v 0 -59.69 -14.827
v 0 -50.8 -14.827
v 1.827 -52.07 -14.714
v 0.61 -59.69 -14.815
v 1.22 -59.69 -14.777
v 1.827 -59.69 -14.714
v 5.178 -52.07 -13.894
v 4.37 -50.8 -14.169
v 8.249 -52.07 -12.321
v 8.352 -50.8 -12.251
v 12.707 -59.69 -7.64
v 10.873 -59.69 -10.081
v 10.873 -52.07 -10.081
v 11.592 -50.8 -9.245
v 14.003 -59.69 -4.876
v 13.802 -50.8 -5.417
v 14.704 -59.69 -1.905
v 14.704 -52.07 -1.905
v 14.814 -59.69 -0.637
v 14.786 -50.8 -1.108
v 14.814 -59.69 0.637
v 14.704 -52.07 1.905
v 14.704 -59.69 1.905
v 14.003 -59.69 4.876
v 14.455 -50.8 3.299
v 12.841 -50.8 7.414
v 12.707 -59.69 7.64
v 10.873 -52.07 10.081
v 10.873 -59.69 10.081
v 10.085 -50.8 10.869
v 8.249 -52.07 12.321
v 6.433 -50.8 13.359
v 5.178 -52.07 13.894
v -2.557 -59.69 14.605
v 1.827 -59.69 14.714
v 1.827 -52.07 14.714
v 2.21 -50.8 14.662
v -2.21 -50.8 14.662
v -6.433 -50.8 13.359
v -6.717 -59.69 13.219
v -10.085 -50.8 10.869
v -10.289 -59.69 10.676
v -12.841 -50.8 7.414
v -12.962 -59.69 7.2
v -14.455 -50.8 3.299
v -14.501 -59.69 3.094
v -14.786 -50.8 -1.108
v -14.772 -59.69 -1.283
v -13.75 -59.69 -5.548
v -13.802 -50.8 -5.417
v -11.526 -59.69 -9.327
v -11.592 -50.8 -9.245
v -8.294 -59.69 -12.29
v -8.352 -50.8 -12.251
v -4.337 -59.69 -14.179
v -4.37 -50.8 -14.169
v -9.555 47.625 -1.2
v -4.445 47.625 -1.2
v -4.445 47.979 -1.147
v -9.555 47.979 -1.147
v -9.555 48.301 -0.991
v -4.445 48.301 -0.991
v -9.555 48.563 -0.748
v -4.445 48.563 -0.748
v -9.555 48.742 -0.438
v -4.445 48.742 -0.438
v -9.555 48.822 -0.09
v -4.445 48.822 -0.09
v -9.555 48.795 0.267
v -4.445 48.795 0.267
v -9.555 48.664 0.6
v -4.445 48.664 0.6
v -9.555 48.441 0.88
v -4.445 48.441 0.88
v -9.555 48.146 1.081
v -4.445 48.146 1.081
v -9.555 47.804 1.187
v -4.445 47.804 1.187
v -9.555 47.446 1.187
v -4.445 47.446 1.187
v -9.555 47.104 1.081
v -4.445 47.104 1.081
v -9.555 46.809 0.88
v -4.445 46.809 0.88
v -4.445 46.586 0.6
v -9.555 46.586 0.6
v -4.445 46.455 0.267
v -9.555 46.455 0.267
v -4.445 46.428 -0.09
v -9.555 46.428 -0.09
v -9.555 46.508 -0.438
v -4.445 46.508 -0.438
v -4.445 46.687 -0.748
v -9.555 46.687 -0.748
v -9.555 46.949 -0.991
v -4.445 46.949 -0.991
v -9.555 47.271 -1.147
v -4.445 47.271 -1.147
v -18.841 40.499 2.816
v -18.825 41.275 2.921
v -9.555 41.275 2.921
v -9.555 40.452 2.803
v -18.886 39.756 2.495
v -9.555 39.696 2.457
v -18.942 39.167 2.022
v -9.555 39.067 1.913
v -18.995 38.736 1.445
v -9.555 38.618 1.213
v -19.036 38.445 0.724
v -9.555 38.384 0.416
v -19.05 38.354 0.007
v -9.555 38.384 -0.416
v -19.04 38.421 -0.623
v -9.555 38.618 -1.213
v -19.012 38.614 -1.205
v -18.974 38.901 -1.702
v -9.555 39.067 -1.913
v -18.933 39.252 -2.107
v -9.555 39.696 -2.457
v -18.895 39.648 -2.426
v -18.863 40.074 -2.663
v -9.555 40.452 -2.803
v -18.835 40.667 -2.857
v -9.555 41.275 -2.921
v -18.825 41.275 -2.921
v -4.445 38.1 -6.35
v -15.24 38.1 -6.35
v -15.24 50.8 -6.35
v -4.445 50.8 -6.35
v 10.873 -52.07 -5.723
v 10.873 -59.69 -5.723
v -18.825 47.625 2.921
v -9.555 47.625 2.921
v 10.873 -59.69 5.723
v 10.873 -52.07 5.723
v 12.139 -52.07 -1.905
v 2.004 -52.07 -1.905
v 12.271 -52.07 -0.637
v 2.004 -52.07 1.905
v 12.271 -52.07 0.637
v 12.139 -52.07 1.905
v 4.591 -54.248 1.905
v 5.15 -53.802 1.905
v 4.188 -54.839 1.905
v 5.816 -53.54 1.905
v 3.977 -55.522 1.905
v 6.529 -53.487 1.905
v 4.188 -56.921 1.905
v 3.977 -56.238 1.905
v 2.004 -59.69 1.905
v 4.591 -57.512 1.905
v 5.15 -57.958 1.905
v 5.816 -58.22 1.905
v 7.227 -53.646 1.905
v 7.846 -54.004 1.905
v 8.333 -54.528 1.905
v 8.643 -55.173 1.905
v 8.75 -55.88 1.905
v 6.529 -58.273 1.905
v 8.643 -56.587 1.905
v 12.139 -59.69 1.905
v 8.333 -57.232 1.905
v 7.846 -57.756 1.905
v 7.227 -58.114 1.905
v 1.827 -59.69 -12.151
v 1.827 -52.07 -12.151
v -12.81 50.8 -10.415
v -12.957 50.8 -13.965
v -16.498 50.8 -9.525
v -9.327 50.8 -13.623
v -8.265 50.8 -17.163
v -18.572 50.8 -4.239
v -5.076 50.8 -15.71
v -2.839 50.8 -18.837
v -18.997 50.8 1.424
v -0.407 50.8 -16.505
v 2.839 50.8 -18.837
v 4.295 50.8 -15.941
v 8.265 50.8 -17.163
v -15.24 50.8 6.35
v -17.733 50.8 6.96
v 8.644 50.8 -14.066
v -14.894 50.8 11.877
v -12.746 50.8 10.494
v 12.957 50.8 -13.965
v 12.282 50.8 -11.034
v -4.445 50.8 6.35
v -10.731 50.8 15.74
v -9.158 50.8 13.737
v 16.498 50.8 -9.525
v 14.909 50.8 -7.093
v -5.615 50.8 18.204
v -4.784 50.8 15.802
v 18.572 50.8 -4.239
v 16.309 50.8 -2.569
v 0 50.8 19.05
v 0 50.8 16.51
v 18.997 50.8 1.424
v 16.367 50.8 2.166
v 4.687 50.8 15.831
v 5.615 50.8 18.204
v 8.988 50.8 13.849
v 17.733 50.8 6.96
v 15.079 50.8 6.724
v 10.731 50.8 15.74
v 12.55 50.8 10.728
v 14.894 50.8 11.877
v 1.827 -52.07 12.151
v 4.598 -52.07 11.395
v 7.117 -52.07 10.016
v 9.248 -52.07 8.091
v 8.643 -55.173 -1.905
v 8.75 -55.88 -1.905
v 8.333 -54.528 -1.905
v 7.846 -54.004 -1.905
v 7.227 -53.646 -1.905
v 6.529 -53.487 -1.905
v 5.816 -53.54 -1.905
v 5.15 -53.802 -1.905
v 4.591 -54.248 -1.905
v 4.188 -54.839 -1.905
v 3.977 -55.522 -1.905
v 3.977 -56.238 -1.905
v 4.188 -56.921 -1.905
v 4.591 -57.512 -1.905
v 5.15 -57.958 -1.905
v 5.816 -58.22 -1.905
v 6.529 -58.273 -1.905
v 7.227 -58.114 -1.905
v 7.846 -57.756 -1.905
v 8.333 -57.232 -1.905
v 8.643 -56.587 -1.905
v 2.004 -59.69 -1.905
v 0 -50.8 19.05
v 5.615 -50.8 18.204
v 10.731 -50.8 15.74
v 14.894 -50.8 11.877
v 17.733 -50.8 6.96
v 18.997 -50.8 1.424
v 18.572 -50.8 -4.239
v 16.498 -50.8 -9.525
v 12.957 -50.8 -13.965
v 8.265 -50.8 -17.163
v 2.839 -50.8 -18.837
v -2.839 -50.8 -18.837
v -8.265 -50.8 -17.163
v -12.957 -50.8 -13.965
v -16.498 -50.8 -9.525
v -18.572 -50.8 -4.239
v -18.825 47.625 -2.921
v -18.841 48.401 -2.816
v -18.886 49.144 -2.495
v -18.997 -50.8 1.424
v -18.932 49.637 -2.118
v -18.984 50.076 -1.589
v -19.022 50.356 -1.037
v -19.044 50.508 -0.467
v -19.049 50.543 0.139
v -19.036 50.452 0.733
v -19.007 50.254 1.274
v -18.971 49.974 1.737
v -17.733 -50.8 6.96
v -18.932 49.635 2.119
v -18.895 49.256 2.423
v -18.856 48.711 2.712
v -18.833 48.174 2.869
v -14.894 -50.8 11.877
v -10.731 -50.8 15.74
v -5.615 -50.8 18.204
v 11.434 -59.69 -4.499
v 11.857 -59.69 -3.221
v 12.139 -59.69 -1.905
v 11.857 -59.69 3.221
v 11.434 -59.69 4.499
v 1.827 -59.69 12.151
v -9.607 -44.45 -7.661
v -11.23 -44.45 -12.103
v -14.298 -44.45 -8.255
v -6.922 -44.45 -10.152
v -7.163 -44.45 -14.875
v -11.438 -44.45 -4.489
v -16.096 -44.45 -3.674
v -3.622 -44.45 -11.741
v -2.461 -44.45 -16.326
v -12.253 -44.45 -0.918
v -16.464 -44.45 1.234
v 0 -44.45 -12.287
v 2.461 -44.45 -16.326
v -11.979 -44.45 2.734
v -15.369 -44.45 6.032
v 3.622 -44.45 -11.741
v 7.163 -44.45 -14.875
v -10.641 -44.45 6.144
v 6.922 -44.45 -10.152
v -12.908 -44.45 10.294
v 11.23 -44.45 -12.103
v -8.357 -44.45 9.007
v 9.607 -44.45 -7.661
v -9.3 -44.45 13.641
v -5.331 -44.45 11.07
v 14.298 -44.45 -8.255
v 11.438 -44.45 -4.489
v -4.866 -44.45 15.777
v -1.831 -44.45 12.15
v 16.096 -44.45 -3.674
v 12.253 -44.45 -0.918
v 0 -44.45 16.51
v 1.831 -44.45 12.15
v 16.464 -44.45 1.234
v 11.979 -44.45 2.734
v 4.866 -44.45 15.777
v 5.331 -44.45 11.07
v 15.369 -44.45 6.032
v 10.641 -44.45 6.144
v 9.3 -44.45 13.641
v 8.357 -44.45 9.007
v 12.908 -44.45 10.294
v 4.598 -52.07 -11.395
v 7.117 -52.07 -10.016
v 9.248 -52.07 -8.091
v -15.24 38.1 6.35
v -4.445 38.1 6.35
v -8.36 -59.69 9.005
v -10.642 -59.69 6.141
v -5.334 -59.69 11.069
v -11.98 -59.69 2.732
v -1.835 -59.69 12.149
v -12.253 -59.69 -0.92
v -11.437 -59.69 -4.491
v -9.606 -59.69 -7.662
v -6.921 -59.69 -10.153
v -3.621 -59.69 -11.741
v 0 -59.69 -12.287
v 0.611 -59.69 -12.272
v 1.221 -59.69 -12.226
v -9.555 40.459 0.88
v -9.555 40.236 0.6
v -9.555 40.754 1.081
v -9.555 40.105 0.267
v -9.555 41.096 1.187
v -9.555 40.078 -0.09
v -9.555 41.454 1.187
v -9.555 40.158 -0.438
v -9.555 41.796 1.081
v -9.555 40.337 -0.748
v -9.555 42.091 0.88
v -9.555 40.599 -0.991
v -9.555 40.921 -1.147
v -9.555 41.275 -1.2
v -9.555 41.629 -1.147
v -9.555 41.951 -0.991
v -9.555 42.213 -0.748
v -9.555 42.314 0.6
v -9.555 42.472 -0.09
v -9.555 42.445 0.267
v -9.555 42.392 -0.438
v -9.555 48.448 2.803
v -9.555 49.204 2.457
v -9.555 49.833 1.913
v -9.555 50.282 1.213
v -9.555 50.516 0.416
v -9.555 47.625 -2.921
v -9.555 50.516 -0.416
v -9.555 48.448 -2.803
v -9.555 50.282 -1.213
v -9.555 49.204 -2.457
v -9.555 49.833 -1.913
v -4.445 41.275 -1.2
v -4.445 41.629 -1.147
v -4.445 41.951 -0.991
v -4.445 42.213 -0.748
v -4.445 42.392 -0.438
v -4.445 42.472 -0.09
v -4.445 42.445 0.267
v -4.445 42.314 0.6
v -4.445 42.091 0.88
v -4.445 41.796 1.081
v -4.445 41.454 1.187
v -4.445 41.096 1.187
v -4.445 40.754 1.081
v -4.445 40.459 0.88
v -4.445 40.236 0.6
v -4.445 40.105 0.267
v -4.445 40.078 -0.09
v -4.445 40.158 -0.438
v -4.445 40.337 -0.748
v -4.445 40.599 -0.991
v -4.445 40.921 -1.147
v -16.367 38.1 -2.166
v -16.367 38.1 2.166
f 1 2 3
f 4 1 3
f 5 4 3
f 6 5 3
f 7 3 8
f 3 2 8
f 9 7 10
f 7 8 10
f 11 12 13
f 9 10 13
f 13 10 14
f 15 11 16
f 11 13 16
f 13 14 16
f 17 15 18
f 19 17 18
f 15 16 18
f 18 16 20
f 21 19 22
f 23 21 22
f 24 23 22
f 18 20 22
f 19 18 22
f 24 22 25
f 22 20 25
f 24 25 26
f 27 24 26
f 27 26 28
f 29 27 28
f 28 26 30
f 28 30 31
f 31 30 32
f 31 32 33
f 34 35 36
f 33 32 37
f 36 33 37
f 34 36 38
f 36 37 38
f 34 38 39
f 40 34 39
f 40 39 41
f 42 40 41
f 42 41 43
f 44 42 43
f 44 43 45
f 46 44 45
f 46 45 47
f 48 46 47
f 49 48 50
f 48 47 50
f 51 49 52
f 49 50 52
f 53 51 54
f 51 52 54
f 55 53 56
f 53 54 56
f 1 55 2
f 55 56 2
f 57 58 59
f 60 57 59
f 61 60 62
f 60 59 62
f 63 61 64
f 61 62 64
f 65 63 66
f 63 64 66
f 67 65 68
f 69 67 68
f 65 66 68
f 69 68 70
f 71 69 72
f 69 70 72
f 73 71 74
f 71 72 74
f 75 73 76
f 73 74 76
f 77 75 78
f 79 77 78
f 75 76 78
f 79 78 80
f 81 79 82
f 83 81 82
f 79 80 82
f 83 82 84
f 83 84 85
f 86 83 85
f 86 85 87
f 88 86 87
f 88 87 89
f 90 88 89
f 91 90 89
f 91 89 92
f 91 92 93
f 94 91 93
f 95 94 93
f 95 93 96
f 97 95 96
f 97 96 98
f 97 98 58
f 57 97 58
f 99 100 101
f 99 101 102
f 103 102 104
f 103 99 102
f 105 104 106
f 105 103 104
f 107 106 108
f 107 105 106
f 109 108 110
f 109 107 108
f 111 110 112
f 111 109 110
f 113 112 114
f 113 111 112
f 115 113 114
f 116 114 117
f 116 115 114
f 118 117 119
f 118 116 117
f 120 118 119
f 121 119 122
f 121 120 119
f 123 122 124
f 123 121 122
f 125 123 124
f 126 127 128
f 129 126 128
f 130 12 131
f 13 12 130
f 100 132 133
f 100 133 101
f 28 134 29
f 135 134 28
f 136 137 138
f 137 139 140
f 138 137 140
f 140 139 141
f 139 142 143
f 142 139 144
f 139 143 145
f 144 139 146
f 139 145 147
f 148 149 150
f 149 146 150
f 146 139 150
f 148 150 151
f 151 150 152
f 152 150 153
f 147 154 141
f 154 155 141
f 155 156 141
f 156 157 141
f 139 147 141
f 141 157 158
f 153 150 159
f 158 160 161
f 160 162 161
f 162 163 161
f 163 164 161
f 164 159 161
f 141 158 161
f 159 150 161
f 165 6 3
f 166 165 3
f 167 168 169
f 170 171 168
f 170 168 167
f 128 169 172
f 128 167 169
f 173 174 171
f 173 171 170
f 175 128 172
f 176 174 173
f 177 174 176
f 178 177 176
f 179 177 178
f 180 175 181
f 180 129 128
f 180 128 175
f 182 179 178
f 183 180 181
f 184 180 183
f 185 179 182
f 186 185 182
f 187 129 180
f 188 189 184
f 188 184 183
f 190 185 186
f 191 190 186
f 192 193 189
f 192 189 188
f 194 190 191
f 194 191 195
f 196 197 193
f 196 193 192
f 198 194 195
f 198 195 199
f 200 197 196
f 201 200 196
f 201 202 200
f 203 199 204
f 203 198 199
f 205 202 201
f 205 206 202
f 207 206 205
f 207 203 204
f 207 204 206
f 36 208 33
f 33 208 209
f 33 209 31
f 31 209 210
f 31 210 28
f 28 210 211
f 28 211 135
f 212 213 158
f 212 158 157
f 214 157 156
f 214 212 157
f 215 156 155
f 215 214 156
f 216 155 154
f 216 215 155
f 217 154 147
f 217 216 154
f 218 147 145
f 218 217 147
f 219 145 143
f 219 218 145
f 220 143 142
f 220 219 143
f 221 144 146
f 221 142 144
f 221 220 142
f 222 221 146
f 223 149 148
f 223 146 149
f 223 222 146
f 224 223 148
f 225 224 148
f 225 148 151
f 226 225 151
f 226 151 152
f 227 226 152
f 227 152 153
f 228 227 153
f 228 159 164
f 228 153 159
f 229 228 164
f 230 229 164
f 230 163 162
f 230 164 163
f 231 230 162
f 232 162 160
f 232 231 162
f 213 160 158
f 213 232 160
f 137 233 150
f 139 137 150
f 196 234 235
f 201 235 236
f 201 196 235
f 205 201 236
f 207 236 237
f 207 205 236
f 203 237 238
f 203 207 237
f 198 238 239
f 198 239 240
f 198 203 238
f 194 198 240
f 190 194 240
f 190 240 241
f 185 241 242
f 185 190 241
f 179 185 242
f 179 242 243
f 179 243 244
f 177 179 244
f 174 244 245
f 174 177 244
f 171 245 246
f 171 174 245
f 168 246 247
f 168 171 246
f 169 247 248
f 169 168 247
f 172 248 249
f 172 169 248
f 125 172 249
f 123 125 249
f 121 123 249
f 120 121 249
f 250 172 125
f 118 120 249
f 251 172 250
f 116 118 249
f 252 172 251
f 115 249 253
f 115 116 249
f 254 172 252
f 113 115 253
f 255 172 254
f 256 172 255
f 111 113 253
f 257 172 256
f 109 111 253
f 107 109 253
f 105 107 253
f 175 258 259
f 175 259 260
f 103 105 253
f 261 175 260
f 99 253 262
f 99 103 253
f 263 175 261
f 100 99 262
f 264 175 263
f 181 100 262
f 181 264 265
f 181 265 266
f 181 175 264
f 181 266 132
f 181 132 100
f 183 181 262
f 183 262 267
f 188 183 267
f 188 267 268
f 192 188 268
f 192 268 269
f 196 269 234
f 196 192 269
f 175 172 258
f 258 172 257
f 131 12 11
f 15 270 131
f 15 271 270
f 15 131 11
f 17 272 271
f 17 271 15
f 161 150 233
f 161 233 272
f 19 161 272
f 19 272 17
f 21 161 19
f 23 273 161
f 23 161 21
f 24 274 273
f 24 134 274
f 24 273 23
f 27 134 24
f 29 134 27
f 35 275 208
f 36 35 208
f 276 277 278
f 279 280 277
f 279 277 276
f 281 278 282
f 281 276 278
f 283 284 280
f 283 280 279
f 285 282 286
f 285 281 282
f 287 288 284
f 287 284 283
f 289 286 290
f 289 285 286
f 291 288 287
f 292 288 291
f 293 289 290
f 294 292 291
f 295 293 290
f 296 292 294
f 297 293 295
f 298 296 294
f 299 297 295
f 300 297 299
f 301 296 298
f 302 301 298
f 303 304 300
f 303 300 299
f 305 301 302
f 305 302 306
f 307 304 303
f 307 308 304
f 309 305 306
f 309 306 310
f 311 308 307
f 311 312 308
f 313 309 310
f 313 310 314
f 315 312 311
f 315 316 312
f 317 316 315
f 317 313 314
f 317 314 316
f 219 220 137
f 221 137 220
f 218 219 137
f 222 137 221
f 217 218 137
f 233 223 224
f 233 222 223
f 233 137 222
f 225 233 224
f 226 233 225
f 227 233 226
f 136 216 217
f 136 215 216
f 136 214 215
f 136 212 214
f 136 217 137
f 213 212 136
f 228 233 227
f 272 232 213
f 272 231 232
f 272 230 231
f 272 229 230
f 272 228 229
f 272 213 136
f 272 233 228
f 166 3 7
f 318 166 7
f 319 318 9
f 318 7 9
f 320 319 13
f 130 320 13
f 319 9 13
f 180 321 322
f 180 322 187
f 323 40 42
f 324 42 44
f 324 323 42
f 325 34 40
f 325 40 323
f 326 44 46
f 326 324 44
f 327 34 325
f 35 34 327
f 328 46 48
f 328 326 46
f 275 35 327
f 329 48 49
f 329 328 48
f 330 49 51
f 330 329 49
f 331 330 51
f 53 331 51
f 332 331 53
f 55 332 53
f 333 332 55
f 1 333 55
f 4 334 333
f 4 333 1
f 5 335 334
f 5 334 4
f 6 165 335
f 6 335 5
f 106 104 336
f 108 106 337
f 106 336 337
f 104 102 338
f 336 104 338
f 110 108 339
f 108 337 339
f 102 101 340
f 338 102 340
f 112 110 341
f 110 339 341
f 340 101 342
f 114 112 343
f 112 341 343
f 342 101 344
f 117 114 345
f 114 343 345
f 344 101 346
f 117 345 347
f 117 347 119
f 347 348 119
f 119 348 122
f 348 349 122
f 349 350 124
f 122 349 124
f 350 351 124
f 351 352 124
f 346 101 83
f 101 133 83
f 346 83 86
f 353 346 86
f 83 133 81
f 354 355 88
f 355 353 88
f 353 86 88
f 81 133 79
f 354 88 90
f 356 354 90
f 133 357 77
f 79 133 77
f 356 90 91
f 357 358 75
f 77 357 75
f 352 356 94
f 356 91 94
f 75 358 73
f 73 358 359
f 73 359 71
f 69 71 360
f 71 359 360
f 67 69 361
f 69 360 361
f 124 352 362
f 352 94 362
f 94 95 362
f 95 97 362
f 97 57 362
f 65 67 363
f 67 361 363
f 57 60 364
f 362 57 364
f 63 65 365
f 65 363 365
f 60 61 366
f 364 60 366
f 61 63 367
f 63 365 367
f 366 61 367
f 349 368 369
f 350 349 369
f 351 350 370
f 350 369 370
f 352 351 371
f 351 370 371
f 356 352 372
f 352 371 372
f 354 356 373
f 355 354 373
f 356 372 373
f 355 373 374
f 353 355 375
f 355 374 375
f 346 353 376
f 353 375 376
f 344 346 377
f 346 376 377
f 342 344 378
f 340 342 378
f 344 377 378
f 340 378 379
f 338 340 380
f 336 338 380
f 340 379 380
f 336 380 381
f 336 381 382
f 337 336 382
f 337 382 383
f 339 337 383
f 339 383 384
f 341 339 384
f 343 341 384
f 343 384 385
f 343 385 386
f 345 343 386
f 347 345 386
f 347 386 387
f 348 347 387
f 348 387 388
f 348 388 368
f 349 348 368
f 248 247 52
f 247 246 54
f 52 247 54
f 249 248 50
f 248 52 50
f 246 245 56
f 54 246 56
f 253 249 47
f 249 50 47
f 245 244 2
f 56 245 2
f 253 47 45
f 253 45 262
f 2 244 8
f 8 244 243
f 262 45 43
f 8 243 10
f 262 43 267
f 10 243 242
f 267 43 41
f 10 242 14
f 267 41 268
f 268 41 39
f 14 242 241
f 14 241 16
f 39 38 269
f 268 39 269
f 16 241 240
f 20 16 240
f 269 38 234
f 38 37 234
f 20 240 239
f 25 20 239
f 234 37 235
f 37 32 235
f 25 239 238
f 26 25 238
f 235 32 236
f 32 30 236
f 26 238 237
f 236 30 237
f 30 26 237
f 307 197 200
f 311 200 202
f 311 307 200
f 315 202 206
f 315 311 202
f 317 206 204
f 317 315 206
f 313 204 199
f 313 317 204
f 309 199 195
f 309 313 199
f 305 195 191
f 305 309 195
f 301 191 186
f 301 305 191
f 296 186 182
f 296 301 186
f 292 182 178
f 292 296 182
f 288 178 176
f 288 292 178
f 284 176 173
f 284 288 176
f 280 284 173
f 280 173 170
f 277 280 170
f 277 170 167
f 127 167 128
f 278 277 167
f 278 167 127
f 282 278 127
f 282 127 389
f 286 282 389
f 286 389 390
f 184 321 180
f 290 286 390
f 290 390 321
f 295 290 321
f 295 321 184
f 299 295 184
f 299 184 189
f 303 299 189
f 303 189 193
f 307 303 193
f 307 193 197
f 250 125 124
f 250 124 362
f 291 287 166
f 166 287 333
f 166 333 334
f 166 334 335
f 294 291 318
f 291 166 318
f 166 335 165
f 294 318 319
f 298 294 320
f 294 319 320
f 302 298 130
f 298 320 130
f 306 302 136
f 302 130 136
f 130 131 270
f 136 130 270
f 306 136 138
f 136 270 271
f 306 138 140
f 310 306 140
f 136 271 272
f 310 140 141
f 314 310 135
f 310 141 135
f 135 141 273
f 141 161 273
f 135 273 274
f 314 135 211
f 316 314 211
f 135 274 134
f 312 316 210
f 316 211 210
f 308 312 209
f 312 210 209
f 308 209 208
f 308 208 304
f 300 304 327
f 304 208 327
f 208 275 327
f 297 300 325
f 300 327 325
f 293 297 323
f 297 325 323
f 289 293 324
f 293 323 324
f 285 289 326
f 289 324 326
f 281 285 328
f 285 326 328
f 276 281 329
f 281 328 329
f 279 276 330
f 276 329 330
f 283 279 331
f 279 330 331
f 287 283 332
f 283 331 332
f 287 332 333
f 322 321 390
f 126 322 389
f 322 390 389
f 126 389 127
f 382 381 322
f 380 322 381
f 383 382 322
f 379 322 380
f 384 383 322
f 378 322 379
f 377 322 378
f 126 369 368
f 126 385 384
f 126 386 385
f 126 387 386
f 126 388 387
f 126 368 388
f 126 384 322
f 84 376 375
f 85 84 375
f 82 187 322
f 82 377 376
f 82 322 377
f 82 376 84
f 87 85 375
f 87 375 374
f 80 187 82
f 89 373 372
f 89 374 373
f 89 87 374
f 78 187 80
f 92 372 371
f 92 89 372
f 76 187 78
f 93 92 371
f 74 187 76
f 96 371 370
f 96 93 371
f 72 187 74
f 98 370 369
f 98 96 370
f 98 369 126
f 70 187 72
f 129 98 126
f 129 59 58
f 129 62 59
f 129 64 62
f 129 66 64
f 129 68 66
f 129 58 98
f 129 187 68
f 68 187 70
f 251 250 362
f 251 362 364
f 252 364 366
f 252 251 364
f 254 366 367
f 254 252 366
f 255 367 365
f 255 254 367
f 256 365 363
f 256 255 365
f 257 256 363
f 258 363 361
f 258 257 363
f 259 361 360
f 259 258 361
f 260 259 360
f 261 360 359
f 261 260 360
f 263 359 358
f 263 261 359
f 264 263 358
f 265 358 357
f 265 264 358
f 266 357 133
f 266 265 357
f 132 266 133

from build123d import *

# Parameters (mm, degrees)
SKETCH1_R               = 19.05
BOSS_EXTRUDE1_DEPTH     = 50.8
SKETCH2_R               = 14.82725
BOSS_EXTRUDE2_DEPTH     = 8.89
CUT_EXTRUDE2_DEPTH      = 114.727064061
CUT_EXTRUDE2_DEPTH_BACK = 95.25
SKETCH4_R               = 16.51
CUT_EXTRUDE3_REACH      = 115.727
SKETCH5_R               = 12.28725
BOSS_EXTRUDE3_START     = -16.51
SKETCH8_W               = 12.7
SKETCH8_H               = 12.7
BOSS_EXTRUDE3_DEPTH     = 12.065
CUT_EXTRUDE5_DEPTH      = 66.488175269
CUT_EXTRUDE5_DEPTH_BACK = 66.488175269
SKETCH9_W               = 9.046009644
SKETCH9_H               = 7.62
SKETCH10_W              = 12.7
SKETCH10_H              = 3.81
BOSS_EXTRUDE4_DEPTH     = 7.62
CUT_EXTRUDE6_DEPTH      = 67.067470248
CUT_EXTRUDE6_DEPTH_BACK = 67.067470248
SKETCH11_R              = 2.4
SKETCH12_R              = 1.2
CUT_EXTRUDE7_DEPTH      = 67.916467517
CUT_EXTRUDE8_DEPTH      = 15.845


with BuildPart() as part:
    # Sketch1 → Boss-Extrude1 (new, symmetric)
    with BuildSketch(Plane(origin=(0, 0, 0), x_dir=(1, 0, 0), z_dir=(0, 1, 0))):
        with Locations(Location((0, 0, 0), (0, 0, 270))):
            Circle(SKETCH1_R)
    extrude(amount=BOSS_EXTRUDE1_DEPTH, both=True)

    # Sketch2 → Boss-Extrude2 (add)
    with BuildSketch(Plane.XZ.offset(50.8)):
        with Locations(Location((0, 0, 0), (0, 0, 270))):
            Circle(SKETCH2_R)
    extrude(amount=BOSS_EXTRUDE2_DEPTH)

    # Sketch4 → Cut-Extrude2 (cut, two sides: drawn at the far end of the back side and taken through both)
    with BuildSketch(Plane(origin=(0, 50.8, 0), x_dir=(1, 0, 0), z_dir=(0, 1, 0)).offset(-CUT_EXTRUDE2_DEPTH_BACK)):
        with Locations(Location((0, 0, 0), (0, 0, 270))):
            Circle(SKETCH4_R)
    extrude(amount=CUT_EXTRUDE2_DEPTH + CUT_EXTRUDE2_DEPTH_BACK, mode=Mode.SUBTRACT)

    # Sketch5 → Cut-Extrude3 (cut, up to next)
    with BuildSketch(Plane.XZ.offset(59.69), mode=Mode.PRIVATE) as cut_extrude3_sk1:
        with Locations(Location((0, 0, 0), (0, 0, 270))):
            Circle(SKETCH5_R)
    cut_extrude3_tool1 = extrude(cut_extrude3_sk1.sketch, amount=-CUT_EXTRUDE3_REACH, mode=Mode.PRIVATE) & part.part
    add(cut_extrude3_tool1.solids().sort_by_distance((0, -59.69, 0))[0], mode=Mode.SUBTRACT)

    # Sketch8 → Boss-Extrude3 (add)
    with BuildSketch(Plane(origin=(0, 0, 0), x_dir=(0, 0, -1), z_dir=(1, 0, 0)).offset(BOSS_EXTRUDE3_START)):
        with Locations((0, 44.45)):
            Rectangle(SKETCH8_W, SKETCH8_H)
    extrude(amount=BOSS_EXTRUDE3_DEPTH)

    # Sketch9 → Cut-Extrude5 (cut, two sides: drawn at the far end of the back side and taken through both)
    with BuildSketch(Plane.XY.offset(-CUT_EXTRUDE5_DEPTH_BACK)):
        with Locations((6.35, -55.88)):
            Rectangle(SKETCH9_W, SKETCH9_H)
    extrude(amount=CUT_EXTRUDE5_DEPTH + CUT_EXTRUDE5_DEPTH_BACK, mode=Mode.SUBTRACT)

    # Sketch10 → Boss-Extrude4 (add)
    with BuildSketch(Plane.XZ.offset(59.69)):
        with Locations((8.354363895, 0)):
            Rectangle(SKETCH10_W, SKETCH10_H)
    extrude(amount=-BOSS_EXTRUDE4_DEPTH)

    # Sketch11 → Cut-Extrude6 (cut, two sides: drawn at the far end of the back side and taken through both)
    with BuildSketch(Plane.XY.offset(1.905).offset(-CUT_EXTRUDE6_DEPTH_BACK)):
        with Locations((6.35, -55.88)):
            Circle(SKETCH11_R)
    extrude(amount=CUT_EXTRUDE6_DEPTH + CUT_EXTRUDE6_DEPTH_BACK, mode=Mode.SUBTRACT)

    # Sketch12 → Cut-Extrude7 (cut, through all)
    with BuildSketch(Plane(origin=(-4.445, 0, 0), x_dir=(0, 0, -1), z_dir=(1, 0, 0))):
        with Locations((0, 41.275)):
            Circle(SKETCH12_R)
        with Locations((0, 47.625)):
            Circle(SKETCH12_R)
    extrude(amount=-CUT_EXTRUDE7_DEPTH, mode=Mode.SUBTRACT)

    # Sketch14 → Cut-Extrude8 (cut)
    with BuildSketch(Plane.ZY.offset(25.4)):
        with BuildLine():
            Line((-2.921, 41.275), (-2.921, 47.625))
            ThreePointArc((-2.921, 47.625), (0, 50.546), (2.921, 47.625))
            Line((2.921, 47.625), (2.921, 41.275))
            ThreePointArc((2.921, 41.275), (0, 38.354), (-2.921, 41.275))
        make_face()
    extrude(amount=-CUT_EXTRUDE8_DEPTH, mode=Mode.SUBTRACT)


solid = part.part
